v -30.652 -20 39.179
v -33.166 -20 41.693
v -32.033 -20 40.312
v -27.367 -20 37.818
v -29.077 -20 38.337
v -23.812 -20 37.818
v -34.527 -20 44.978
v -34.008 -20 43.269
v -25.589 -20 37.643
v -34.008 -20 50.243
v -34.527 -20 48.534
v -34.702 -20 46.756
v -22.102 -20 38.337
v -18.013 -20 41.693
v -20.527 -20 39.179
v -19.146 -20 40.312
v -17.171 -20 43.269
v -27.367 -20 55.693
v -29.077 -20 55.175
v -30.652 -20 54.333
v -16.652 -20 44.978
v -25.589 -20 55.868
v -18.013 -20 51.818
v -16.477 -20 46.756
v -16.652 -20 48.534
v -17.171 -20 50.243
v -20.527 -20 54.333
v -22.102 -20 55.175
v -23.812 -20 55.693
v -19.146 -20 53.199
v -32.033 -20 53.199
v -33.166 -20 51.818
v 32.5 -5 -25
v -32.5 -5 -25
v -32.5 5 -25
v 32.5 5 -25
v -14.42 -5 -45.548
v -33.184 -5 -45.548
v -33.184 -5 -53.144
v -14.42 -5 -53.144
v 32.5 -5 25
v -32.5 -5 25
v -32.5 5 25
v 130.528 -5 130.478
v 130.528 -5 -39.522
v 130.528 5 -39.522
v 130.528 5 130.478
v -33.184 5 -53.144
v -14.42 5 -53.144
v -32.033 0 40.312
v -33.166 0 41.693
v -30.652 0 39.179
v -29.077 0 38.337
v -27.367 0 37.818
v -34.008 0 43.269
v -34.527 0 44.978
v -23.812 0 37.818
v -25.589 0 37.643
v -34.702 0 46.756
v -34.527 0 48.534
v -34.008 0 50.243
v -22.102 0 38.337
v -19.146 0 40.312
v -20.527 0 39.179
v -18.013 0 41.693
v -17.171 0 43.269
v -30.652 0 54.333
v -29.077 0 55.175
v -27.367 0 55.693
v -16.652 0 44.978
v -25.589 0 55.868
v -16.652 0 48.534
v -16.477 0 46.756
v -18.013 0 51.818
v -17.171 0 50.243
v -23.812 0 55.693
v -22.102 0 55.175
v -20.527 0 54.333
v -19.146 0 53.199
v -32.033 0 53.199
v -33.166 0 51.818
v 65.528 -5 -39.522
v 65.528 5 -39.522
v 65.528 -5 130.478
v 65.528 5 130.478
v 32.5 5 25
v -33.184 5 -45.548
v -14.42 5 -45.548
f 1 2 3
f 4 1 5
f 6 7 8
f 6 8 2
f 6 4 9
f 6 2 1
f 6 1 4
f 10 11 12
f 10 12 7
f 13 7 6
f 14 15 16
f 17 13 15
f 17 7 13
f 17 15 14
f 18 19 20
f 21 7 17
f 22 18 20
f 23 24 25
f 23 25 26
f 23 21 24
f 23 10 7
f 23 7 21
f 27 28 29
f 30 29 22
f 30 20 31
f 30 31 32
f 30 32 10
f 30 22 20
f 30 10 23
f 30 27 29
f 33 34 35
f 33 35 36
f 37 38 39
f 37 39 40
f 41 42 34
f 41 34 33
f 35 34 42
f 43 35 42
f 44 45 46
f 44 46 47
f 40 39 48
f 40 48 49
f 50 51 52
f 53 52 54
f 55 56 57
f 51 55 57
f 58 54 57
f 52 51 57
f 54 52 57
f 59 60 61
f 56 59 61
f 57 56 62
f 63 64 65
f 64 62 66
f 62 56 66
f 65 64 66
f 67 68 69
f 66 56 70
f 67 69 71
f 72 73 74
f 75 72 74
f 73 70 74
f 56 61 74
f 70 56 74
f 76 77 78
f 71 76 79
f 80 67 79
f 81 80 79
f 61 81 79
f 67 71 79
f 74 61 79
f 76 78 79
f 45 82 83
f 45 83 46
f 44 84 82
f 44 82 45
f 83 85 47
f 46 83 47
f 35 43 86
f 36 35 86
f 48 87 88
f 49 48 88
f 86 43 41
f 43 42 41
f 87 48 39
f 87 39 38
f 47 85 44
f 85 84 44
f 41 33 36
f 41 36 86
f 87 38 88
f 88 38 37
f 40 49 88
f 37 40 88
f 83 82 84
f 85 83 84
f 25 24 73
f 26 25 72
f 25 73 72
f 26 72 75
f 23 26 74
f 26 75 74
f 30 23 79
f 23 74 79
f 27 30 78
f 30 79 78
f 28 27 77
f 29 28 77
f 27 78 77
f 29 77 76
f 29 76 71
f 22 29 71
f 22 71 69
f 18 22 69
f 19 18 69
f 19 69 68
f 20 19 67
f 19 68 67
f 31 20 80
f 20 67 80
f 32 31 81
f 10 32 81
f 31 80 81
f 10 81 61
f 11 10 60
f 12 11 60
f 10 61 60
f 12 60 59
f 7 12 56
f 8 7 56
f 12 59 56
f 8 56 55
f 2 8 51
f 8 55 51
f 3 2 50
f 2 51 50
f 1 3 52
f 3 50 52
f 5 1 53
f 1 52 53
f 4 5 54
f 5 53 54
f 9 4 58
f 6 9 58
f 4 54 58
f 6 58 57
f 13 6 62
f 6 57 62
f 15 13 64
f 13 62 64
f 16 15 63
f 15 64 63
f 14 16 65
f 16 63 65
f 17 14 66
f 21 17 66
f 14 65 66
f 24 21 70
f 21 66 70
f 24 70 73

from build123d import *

# Parameters (mm, degrees)
F0_W     = 65
F0_H     = 50
F1_DEPTH = 5
F2_W     = 65
F2_H     = 170
F3_DEPTH = 5
F4_R     = 9.112465
F5_DEPTH = 20
F6_W     = 18.764562
F6_H     = 7.595181
F7_DEPTH = 5


with BuildPart() as f1:
    # F0 (on Front) → F1 (new body, symmetric)
    with BuildSketch(Plane.XZ):
        Rectangle(F0_W, F0_H)
    extrude(amount=F1_DEPTH, both=True)


with BuildPart() as f3:
    # F2 (on Front) → F3 (new body, symmetric)
    with BuildSketch(Plane.XZ):
        with Locations((98.028367, 45.478269)):
            Rectangle(F2_W, F2_H)
    extrude(amount=F3_DEPTH, both=True)


with BuildPart() as f5:
    # F4 (on Front) → F5 (new body)
    with BuildSketch(Plane.XZ):
        with Locations((-25.589339, 46.755835)):
            Circle(F4_R)
    extrude(amount=F5_DEPTH)


with BuildPart() as f7:
    # F6 (on Front) → F7 (new body, symmetric)
    with BuildSketch(Plane.XZ):
        with Locations((-23.802137, -49.34603)):
            Rectangle(F6_W, F6_H)
    extrude(amount=F7_DEPTH, both=True)


solid = Compound([f1.part, f3.part, f5.part, f7.part])
